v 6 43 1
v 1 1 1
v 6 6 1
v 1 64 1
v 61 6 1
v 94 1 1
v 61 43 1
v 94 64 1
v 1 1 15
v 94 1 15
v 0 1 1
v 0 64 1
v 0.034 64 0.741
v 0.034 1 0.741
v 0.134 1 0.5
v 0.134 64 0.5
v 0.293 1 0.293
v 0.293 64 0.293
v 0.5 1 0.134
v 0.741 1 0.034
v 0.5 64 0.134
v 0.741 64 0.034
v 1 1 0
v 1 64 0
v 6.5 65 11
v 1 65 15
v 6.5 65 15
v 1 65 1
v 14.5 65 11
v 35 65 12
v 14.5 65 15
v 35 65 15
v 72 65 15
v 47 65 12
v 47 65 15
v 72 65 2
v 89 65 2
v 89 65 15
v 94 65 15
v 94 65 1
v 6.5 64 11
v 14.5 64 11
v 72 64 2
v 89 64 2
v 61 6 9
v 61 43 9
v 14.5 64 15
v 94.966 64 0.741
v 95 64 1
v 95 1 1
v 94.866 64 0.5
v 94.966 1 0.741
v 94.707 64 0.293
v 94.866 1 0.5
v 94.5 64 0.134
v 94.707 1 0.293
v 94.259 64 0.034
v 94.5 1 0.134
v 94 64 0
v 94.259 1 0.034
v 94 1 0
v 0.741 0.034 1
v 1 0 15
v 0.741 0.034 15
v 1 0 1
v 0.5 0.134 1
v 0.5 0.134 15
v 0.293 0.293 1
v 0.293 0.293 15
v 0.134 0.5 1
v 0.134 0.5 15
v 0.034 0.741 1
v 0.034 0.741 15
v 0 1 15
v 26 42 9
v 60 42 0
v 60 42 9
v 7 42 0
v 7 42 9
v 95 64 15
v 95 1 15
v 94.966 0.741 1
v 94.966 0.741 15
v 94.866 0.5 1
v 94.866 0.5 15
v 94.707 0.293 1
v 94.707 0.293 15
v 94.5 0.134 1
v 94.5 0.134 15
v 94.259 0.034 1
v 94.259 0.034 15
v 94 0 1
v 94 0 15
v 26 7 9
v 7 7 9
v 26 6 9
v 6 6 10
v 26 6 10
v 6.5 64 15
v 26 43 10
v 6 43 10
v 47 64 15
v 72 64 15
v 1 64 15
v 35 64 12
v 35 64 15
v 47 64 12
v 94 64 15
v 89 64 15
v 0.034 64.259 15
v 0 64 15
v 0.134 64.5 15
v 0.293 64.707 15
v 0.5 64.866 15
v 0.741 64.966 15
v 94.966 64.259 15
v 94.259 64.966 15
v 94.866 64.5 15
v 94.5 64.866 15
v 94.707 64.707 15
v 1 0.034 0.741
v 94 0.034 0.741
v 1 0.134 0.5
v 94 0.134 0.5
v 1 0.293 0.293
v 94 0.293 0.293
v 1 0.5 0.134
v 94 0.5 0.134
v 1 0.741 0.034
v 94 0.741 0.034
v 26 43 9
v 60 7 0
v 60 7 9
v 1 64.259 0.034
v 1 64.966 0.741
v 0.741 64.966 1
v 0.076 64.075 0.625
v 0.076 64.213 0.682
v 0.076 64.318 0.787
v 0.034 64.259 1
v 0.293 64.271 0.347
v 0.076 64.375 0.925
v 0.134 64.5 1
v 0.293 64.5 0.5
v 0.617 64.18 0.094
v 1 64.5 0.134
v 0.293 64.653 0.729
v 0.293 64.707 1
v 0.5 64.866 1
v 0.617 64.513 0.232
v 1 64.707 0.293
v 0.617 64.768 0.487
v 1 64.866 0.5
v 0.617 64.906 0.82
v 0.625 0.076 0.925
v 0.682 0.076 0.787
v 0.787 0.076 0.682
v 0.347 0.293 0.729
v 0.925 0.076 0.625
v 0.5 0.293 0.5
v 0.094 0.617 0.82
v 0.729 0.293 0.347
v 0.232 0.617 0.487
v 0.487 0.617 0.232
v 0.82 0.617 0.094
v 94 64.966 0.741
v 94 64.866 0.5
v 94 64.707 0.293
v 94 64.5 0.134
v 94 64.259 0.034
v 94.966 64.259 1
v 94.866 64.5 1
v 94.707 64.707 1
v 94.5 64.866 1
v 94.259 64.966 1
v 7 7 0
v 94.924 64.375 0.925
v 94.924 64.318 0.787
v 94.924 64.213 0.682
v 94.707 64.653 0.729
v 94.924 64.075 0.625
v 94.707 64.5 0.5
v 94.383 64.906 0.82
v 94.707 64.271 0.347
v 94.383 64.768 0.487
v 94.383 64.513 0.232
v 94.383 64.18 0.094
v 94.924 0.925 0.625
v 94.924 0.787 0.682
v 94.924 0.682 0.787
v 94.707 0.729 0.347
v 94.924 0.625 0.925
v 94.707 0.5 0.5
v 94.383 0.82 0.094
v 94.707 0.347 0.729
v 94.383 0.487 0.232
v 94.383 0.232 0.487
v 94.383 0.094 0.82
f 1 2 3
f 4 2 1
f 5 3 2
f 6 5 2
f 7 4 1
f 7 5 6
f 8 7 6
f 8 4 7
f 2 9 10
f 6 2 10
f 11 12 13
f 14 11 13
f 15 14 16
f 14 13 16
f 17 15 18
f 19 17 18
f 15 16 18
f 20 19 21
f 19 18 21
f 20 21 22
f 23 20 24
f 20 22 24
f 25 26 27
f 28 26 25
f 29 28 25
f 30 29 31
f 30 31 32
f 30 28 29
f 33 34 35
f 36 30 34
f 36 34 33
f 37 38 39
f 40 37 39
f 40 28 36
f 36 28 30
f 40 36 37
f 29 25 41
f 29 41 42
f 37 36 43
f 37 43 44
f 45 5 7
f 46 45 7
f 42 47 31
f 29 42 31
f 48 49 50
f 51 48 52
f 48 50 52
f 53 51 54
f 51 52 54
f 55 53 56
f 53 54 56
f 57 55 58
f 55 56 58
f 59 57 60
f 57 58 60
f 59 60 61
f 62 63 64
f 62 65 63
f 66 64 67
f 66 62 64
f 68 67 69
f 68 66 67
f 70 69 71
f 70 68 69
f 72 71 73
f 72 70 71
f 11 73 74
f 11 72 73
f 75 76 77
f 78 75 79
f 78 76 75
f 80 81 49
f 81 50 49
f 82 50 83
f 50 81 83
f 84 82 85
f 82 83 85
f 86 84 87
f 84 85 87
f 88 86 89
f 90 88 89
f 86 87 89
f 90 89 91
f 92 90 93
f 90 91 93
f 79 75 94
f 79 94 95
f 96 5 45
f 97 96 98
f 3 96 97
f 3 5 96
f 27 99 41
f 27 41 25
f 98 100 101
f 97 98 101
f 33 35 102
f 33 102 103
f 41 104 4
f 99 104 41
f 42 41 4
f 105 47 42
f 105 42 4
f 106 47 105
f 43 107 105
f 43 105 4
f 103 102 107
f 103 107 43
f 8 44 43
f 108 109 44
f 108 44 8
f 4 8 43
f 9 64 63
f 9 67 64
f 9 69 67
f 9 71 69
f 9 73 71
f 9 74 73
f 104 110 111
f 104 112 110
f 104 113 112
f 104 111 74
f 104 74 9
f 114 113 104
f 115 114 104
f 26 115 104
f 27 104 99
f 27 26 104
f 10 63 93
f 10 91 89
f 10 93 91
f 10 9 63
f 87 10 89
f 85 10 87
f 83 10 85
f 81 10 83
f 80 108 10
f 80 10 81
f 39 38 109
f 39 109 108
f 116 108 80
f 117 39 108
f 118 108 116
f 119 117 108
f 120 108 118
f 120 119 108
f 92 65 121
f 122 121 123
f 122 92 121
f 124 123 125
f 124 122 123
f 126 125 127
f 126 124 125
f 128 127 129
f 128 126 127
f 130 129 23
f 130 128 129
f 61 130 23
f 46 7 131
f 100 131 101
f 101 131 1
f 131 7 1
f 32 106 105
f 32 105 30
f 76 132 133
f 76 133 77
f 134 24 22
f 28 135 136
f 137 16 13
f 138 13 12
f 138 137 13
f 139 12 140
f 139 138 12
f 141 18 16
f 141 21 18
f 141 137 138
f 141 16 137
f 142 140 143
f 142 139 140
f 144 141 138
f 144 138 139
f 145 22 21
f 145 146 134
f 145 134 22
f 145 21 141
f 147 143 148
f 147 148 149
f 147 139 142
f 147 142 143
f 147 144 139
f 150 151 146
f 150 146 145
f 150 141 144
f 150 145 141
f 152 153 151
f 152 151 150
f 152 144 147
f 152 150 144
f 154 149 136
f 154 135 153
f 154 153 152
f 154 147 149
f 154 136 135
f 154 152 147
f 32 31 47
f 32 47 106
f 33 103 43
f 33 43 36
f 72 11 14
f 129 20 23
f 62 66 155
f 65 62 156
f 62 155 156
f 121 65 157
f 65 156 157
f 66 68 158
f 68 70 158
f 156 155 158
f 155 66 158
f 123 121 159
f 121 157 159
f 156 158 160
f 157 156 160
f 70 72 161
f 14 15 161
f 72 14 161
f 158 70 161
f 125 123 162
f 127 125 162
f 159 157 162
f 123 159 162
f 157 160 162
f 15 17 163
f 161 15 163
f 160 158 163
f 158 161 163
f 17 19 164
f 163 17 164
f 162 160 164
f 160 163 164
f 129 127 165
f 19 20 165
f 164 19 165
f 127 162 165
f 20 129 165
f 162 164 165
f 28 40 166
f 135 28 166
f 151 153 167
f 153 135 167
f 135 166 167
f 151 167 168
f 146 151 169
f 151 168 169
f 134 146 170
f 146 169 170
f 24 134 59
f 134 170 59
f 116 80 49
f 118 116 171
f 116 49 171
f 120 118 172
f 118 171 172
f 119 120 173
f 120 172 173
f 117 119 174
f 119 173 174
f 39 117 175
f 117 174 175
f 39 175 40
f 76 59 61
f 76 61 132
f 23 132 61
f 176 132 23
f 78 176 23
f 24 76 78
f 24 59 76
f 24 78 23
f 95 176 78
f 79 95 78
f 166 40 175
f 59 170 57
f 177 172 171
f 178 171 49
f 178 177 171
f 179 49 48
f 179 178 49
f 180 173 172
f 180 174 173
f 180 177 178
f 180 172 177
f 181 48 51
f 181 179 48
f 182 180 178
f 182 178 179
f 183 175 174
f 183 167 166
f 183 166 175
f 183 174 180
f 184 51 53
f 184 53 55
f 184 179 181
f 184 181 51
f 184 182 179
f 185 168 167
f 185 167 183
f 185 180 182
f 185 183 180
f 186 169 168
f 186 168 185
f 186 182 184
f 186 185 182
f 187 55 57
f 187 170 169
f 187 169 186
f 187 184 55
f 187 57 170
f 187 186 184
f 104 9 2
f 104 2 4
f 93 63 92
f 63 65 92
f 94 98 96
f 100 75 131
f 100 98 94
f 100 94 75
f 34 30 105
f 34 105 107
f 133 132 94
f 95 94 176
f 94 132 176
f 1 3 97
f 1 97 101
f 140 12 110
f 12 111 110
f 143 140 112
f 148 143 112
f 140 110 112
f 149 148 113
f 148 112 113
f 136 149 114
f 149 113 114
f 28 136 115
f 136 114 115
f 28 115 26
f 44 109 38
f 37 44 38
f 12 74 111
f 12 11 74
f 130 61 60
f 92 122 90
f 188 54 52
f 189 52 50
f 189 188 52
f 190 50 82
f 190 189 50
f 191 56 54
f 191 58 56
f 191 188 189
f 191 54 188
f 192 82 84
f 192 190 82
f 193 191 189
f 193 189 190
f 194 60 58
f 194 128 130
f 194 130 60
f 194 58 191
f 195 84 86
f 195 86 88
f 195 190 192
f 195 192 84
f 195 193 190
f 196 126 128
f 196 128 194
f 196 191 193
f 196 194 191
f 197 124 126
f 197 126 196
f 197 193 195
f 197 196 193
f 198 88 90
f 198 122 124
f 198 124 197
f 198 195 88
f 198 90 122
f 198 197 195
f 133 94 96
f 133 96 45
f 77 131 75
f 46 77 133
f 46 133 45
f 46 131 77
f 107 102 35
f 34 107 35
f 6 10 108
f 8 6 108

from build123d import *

# Parameters (mm, degrees)
SKETCH_1_W             = 95
SKETCH_1_H             = 65
EXTRUDE_220_DEPTH      = 15
SKETCH_2_W             = 93
SKETCH_2_H             = 63
CUT_EXTRUDE_347_DEPTH  = 14
SKETCH_3_W             = 17
SKETCH_3_H             = 1
ETHERNET_DEPTH         = 13
FILLET_1_R             = 1
FILLET_2_R             = 1
FILLET_3_R             = 1
FILLET_4_R             = 1
SKETCH_4_W             = 8
SKETCH_4_H             = 1
USB_DEPTH              = 4
SKETCH_5_W             = 12
SKETCH_5_H             = 1
MICROSD_DEPTH          = 3
SKETCH_7_W             = 55
SKETCH_7_H             = 37
EXTRUDE_1830_DEPTH     = 10
SKETCH_6_W             = 53
SKETCH_6_H             = 35
CUT_EXTRUDE_1960_DEPTH = 9
SKETCH_8_W             = 35
SKETCH_8_H             = 37
CUT_EXTRUDE_8_DEPTH    = 1


with BuildPart() as part:
    # Эскиз1 → Extrude 220 (new body)
    with BuildSketch(Plane.XY):
        with Locations((47.5, 32.5)):
            Rectangle(SKETCH_1_W, SKETCH_1_H)
    extrude(amount=EXTRUDE_220_DEPTH)

    # Эскиз2 → Cut-Extrude 347 (cut)
    with BuildSketch(Plane.XY.offset(15)):
        with Locations((47.5, 32.5)):
            Rectangle(SKETCH_2_W, SKETCH_2_H)
    extrude(amount=-CUT_EXTRUDE_347_DEPTH, mode=Mode.SUBTRACT)

    # Эскиз3 → Ethernet (cut)
    with BuildSketch(Plane.XY.offset(15)):
        with Locations((80.5, 64.5)):
            Rectangle(SKETCH_3_W, SKETCH_3_H)
    extrude(amount=-ETHERNET_DEPTH, mode=Mode.SUBTRACT)

    # Скругление1
    fillet_1_edges = [part.edges().sort_by_distance(p)[0] for p in [
        (47.5, 65, 0),
    ]]
    fillet(fillet_1_edges, radius=FILLET_1_R)

    # Скругление2
    fillet_2_edges = [part.edges().sort_by_distance(p)[0] for p in [
        (0, 32, 0),
        (0, 64.707106781, 0.292893219),
        (0, 65, 8),
    ]]
    fillet(fillet_2_edges, radius=FILLET_2_R)

    # Скругление3
    fillet_3_edges = [part.edges().sort_by_distance(p)[0] for p in [
        (48, 0, 0),
        (0.292893219, 0, 0.292893219),
        (0, 0, 8),
    ]]
    fillet(fillet_3_edges, radius=FILLET_3_R)

    # Скругление4
    fillet_4_edges = [part.edges().sort_by_distance(p)[0] for p in [
        (95, 64.707106781, 0.292893219),
        (95, 32.5, 0),
        (95, 0.292893219, 0.292893219),
        (95, 65, 8),
        (95, 0, 8),
    ]]
    fillet(fillet_4_edges, radius=FILLET_4_R)

    # Эскиз4 → USB (cut)
    with BuildSketch(Plane.XY.offset(15)):
        with Locations((10.5, 64.5)):
            Rectangle(SKETCH_4_W, SKETCH_4_H)
    extrude(amount=-USB_DEPTH, mode=Mode.SUBTRACT)

    # Эскиз5 → MicroSD (cut)
    with BuildSketch(Plane.XY.offset(15)):
        with Locations((41, 64.5)):
            Rectangle(SKETCH_5_W, SKETCH_5_H)
    extrude(amount=-MICROSD_DEPTH, mode=Mode.SUBTRACT)

    # Эскиз7 → Extrude 1830 (add)
    with BuildSketch(Plane(origin=(0, 0, 0), x_dir=(-1, 0, 0), z_dir=(0, 0, -1))):
        with Locations((-33.5, 24.5)):
            Rectangle(SKETCH_7_W, SKETCH_7_H)
    extrude(amount=-EXTRUDE_1830_DEPTH)

    # Эскиз6 → Cut-Extrude 1960 (cut)
    with BuildSketch(Plane(origin=(0, 0, 0), x_dir=(-1, 0, 0), z_dir=(0, 0, -1))):
        with Locations((-33.5, 24.5)):
            Rectangle(SKETCH_6_W, SKETCH_6_H)
    extrude(amount=-CUT_EXTRUDE_1960_DEPTH, mode=Mode.SUBTRACT)

    # Эскиз8 → Вытянуть8 (cut)
    with BuildSketch(Plane.XY.offset(10)):
        with Locations((43.5, 24.5)):
            Rectangle(SKETCH_8_W, SKETCH_8_H)
    extrude(amount=-CUT_EXTRUDE_8_DEPTH, mode=Mode.SUBTRACT)


solid = part.part
